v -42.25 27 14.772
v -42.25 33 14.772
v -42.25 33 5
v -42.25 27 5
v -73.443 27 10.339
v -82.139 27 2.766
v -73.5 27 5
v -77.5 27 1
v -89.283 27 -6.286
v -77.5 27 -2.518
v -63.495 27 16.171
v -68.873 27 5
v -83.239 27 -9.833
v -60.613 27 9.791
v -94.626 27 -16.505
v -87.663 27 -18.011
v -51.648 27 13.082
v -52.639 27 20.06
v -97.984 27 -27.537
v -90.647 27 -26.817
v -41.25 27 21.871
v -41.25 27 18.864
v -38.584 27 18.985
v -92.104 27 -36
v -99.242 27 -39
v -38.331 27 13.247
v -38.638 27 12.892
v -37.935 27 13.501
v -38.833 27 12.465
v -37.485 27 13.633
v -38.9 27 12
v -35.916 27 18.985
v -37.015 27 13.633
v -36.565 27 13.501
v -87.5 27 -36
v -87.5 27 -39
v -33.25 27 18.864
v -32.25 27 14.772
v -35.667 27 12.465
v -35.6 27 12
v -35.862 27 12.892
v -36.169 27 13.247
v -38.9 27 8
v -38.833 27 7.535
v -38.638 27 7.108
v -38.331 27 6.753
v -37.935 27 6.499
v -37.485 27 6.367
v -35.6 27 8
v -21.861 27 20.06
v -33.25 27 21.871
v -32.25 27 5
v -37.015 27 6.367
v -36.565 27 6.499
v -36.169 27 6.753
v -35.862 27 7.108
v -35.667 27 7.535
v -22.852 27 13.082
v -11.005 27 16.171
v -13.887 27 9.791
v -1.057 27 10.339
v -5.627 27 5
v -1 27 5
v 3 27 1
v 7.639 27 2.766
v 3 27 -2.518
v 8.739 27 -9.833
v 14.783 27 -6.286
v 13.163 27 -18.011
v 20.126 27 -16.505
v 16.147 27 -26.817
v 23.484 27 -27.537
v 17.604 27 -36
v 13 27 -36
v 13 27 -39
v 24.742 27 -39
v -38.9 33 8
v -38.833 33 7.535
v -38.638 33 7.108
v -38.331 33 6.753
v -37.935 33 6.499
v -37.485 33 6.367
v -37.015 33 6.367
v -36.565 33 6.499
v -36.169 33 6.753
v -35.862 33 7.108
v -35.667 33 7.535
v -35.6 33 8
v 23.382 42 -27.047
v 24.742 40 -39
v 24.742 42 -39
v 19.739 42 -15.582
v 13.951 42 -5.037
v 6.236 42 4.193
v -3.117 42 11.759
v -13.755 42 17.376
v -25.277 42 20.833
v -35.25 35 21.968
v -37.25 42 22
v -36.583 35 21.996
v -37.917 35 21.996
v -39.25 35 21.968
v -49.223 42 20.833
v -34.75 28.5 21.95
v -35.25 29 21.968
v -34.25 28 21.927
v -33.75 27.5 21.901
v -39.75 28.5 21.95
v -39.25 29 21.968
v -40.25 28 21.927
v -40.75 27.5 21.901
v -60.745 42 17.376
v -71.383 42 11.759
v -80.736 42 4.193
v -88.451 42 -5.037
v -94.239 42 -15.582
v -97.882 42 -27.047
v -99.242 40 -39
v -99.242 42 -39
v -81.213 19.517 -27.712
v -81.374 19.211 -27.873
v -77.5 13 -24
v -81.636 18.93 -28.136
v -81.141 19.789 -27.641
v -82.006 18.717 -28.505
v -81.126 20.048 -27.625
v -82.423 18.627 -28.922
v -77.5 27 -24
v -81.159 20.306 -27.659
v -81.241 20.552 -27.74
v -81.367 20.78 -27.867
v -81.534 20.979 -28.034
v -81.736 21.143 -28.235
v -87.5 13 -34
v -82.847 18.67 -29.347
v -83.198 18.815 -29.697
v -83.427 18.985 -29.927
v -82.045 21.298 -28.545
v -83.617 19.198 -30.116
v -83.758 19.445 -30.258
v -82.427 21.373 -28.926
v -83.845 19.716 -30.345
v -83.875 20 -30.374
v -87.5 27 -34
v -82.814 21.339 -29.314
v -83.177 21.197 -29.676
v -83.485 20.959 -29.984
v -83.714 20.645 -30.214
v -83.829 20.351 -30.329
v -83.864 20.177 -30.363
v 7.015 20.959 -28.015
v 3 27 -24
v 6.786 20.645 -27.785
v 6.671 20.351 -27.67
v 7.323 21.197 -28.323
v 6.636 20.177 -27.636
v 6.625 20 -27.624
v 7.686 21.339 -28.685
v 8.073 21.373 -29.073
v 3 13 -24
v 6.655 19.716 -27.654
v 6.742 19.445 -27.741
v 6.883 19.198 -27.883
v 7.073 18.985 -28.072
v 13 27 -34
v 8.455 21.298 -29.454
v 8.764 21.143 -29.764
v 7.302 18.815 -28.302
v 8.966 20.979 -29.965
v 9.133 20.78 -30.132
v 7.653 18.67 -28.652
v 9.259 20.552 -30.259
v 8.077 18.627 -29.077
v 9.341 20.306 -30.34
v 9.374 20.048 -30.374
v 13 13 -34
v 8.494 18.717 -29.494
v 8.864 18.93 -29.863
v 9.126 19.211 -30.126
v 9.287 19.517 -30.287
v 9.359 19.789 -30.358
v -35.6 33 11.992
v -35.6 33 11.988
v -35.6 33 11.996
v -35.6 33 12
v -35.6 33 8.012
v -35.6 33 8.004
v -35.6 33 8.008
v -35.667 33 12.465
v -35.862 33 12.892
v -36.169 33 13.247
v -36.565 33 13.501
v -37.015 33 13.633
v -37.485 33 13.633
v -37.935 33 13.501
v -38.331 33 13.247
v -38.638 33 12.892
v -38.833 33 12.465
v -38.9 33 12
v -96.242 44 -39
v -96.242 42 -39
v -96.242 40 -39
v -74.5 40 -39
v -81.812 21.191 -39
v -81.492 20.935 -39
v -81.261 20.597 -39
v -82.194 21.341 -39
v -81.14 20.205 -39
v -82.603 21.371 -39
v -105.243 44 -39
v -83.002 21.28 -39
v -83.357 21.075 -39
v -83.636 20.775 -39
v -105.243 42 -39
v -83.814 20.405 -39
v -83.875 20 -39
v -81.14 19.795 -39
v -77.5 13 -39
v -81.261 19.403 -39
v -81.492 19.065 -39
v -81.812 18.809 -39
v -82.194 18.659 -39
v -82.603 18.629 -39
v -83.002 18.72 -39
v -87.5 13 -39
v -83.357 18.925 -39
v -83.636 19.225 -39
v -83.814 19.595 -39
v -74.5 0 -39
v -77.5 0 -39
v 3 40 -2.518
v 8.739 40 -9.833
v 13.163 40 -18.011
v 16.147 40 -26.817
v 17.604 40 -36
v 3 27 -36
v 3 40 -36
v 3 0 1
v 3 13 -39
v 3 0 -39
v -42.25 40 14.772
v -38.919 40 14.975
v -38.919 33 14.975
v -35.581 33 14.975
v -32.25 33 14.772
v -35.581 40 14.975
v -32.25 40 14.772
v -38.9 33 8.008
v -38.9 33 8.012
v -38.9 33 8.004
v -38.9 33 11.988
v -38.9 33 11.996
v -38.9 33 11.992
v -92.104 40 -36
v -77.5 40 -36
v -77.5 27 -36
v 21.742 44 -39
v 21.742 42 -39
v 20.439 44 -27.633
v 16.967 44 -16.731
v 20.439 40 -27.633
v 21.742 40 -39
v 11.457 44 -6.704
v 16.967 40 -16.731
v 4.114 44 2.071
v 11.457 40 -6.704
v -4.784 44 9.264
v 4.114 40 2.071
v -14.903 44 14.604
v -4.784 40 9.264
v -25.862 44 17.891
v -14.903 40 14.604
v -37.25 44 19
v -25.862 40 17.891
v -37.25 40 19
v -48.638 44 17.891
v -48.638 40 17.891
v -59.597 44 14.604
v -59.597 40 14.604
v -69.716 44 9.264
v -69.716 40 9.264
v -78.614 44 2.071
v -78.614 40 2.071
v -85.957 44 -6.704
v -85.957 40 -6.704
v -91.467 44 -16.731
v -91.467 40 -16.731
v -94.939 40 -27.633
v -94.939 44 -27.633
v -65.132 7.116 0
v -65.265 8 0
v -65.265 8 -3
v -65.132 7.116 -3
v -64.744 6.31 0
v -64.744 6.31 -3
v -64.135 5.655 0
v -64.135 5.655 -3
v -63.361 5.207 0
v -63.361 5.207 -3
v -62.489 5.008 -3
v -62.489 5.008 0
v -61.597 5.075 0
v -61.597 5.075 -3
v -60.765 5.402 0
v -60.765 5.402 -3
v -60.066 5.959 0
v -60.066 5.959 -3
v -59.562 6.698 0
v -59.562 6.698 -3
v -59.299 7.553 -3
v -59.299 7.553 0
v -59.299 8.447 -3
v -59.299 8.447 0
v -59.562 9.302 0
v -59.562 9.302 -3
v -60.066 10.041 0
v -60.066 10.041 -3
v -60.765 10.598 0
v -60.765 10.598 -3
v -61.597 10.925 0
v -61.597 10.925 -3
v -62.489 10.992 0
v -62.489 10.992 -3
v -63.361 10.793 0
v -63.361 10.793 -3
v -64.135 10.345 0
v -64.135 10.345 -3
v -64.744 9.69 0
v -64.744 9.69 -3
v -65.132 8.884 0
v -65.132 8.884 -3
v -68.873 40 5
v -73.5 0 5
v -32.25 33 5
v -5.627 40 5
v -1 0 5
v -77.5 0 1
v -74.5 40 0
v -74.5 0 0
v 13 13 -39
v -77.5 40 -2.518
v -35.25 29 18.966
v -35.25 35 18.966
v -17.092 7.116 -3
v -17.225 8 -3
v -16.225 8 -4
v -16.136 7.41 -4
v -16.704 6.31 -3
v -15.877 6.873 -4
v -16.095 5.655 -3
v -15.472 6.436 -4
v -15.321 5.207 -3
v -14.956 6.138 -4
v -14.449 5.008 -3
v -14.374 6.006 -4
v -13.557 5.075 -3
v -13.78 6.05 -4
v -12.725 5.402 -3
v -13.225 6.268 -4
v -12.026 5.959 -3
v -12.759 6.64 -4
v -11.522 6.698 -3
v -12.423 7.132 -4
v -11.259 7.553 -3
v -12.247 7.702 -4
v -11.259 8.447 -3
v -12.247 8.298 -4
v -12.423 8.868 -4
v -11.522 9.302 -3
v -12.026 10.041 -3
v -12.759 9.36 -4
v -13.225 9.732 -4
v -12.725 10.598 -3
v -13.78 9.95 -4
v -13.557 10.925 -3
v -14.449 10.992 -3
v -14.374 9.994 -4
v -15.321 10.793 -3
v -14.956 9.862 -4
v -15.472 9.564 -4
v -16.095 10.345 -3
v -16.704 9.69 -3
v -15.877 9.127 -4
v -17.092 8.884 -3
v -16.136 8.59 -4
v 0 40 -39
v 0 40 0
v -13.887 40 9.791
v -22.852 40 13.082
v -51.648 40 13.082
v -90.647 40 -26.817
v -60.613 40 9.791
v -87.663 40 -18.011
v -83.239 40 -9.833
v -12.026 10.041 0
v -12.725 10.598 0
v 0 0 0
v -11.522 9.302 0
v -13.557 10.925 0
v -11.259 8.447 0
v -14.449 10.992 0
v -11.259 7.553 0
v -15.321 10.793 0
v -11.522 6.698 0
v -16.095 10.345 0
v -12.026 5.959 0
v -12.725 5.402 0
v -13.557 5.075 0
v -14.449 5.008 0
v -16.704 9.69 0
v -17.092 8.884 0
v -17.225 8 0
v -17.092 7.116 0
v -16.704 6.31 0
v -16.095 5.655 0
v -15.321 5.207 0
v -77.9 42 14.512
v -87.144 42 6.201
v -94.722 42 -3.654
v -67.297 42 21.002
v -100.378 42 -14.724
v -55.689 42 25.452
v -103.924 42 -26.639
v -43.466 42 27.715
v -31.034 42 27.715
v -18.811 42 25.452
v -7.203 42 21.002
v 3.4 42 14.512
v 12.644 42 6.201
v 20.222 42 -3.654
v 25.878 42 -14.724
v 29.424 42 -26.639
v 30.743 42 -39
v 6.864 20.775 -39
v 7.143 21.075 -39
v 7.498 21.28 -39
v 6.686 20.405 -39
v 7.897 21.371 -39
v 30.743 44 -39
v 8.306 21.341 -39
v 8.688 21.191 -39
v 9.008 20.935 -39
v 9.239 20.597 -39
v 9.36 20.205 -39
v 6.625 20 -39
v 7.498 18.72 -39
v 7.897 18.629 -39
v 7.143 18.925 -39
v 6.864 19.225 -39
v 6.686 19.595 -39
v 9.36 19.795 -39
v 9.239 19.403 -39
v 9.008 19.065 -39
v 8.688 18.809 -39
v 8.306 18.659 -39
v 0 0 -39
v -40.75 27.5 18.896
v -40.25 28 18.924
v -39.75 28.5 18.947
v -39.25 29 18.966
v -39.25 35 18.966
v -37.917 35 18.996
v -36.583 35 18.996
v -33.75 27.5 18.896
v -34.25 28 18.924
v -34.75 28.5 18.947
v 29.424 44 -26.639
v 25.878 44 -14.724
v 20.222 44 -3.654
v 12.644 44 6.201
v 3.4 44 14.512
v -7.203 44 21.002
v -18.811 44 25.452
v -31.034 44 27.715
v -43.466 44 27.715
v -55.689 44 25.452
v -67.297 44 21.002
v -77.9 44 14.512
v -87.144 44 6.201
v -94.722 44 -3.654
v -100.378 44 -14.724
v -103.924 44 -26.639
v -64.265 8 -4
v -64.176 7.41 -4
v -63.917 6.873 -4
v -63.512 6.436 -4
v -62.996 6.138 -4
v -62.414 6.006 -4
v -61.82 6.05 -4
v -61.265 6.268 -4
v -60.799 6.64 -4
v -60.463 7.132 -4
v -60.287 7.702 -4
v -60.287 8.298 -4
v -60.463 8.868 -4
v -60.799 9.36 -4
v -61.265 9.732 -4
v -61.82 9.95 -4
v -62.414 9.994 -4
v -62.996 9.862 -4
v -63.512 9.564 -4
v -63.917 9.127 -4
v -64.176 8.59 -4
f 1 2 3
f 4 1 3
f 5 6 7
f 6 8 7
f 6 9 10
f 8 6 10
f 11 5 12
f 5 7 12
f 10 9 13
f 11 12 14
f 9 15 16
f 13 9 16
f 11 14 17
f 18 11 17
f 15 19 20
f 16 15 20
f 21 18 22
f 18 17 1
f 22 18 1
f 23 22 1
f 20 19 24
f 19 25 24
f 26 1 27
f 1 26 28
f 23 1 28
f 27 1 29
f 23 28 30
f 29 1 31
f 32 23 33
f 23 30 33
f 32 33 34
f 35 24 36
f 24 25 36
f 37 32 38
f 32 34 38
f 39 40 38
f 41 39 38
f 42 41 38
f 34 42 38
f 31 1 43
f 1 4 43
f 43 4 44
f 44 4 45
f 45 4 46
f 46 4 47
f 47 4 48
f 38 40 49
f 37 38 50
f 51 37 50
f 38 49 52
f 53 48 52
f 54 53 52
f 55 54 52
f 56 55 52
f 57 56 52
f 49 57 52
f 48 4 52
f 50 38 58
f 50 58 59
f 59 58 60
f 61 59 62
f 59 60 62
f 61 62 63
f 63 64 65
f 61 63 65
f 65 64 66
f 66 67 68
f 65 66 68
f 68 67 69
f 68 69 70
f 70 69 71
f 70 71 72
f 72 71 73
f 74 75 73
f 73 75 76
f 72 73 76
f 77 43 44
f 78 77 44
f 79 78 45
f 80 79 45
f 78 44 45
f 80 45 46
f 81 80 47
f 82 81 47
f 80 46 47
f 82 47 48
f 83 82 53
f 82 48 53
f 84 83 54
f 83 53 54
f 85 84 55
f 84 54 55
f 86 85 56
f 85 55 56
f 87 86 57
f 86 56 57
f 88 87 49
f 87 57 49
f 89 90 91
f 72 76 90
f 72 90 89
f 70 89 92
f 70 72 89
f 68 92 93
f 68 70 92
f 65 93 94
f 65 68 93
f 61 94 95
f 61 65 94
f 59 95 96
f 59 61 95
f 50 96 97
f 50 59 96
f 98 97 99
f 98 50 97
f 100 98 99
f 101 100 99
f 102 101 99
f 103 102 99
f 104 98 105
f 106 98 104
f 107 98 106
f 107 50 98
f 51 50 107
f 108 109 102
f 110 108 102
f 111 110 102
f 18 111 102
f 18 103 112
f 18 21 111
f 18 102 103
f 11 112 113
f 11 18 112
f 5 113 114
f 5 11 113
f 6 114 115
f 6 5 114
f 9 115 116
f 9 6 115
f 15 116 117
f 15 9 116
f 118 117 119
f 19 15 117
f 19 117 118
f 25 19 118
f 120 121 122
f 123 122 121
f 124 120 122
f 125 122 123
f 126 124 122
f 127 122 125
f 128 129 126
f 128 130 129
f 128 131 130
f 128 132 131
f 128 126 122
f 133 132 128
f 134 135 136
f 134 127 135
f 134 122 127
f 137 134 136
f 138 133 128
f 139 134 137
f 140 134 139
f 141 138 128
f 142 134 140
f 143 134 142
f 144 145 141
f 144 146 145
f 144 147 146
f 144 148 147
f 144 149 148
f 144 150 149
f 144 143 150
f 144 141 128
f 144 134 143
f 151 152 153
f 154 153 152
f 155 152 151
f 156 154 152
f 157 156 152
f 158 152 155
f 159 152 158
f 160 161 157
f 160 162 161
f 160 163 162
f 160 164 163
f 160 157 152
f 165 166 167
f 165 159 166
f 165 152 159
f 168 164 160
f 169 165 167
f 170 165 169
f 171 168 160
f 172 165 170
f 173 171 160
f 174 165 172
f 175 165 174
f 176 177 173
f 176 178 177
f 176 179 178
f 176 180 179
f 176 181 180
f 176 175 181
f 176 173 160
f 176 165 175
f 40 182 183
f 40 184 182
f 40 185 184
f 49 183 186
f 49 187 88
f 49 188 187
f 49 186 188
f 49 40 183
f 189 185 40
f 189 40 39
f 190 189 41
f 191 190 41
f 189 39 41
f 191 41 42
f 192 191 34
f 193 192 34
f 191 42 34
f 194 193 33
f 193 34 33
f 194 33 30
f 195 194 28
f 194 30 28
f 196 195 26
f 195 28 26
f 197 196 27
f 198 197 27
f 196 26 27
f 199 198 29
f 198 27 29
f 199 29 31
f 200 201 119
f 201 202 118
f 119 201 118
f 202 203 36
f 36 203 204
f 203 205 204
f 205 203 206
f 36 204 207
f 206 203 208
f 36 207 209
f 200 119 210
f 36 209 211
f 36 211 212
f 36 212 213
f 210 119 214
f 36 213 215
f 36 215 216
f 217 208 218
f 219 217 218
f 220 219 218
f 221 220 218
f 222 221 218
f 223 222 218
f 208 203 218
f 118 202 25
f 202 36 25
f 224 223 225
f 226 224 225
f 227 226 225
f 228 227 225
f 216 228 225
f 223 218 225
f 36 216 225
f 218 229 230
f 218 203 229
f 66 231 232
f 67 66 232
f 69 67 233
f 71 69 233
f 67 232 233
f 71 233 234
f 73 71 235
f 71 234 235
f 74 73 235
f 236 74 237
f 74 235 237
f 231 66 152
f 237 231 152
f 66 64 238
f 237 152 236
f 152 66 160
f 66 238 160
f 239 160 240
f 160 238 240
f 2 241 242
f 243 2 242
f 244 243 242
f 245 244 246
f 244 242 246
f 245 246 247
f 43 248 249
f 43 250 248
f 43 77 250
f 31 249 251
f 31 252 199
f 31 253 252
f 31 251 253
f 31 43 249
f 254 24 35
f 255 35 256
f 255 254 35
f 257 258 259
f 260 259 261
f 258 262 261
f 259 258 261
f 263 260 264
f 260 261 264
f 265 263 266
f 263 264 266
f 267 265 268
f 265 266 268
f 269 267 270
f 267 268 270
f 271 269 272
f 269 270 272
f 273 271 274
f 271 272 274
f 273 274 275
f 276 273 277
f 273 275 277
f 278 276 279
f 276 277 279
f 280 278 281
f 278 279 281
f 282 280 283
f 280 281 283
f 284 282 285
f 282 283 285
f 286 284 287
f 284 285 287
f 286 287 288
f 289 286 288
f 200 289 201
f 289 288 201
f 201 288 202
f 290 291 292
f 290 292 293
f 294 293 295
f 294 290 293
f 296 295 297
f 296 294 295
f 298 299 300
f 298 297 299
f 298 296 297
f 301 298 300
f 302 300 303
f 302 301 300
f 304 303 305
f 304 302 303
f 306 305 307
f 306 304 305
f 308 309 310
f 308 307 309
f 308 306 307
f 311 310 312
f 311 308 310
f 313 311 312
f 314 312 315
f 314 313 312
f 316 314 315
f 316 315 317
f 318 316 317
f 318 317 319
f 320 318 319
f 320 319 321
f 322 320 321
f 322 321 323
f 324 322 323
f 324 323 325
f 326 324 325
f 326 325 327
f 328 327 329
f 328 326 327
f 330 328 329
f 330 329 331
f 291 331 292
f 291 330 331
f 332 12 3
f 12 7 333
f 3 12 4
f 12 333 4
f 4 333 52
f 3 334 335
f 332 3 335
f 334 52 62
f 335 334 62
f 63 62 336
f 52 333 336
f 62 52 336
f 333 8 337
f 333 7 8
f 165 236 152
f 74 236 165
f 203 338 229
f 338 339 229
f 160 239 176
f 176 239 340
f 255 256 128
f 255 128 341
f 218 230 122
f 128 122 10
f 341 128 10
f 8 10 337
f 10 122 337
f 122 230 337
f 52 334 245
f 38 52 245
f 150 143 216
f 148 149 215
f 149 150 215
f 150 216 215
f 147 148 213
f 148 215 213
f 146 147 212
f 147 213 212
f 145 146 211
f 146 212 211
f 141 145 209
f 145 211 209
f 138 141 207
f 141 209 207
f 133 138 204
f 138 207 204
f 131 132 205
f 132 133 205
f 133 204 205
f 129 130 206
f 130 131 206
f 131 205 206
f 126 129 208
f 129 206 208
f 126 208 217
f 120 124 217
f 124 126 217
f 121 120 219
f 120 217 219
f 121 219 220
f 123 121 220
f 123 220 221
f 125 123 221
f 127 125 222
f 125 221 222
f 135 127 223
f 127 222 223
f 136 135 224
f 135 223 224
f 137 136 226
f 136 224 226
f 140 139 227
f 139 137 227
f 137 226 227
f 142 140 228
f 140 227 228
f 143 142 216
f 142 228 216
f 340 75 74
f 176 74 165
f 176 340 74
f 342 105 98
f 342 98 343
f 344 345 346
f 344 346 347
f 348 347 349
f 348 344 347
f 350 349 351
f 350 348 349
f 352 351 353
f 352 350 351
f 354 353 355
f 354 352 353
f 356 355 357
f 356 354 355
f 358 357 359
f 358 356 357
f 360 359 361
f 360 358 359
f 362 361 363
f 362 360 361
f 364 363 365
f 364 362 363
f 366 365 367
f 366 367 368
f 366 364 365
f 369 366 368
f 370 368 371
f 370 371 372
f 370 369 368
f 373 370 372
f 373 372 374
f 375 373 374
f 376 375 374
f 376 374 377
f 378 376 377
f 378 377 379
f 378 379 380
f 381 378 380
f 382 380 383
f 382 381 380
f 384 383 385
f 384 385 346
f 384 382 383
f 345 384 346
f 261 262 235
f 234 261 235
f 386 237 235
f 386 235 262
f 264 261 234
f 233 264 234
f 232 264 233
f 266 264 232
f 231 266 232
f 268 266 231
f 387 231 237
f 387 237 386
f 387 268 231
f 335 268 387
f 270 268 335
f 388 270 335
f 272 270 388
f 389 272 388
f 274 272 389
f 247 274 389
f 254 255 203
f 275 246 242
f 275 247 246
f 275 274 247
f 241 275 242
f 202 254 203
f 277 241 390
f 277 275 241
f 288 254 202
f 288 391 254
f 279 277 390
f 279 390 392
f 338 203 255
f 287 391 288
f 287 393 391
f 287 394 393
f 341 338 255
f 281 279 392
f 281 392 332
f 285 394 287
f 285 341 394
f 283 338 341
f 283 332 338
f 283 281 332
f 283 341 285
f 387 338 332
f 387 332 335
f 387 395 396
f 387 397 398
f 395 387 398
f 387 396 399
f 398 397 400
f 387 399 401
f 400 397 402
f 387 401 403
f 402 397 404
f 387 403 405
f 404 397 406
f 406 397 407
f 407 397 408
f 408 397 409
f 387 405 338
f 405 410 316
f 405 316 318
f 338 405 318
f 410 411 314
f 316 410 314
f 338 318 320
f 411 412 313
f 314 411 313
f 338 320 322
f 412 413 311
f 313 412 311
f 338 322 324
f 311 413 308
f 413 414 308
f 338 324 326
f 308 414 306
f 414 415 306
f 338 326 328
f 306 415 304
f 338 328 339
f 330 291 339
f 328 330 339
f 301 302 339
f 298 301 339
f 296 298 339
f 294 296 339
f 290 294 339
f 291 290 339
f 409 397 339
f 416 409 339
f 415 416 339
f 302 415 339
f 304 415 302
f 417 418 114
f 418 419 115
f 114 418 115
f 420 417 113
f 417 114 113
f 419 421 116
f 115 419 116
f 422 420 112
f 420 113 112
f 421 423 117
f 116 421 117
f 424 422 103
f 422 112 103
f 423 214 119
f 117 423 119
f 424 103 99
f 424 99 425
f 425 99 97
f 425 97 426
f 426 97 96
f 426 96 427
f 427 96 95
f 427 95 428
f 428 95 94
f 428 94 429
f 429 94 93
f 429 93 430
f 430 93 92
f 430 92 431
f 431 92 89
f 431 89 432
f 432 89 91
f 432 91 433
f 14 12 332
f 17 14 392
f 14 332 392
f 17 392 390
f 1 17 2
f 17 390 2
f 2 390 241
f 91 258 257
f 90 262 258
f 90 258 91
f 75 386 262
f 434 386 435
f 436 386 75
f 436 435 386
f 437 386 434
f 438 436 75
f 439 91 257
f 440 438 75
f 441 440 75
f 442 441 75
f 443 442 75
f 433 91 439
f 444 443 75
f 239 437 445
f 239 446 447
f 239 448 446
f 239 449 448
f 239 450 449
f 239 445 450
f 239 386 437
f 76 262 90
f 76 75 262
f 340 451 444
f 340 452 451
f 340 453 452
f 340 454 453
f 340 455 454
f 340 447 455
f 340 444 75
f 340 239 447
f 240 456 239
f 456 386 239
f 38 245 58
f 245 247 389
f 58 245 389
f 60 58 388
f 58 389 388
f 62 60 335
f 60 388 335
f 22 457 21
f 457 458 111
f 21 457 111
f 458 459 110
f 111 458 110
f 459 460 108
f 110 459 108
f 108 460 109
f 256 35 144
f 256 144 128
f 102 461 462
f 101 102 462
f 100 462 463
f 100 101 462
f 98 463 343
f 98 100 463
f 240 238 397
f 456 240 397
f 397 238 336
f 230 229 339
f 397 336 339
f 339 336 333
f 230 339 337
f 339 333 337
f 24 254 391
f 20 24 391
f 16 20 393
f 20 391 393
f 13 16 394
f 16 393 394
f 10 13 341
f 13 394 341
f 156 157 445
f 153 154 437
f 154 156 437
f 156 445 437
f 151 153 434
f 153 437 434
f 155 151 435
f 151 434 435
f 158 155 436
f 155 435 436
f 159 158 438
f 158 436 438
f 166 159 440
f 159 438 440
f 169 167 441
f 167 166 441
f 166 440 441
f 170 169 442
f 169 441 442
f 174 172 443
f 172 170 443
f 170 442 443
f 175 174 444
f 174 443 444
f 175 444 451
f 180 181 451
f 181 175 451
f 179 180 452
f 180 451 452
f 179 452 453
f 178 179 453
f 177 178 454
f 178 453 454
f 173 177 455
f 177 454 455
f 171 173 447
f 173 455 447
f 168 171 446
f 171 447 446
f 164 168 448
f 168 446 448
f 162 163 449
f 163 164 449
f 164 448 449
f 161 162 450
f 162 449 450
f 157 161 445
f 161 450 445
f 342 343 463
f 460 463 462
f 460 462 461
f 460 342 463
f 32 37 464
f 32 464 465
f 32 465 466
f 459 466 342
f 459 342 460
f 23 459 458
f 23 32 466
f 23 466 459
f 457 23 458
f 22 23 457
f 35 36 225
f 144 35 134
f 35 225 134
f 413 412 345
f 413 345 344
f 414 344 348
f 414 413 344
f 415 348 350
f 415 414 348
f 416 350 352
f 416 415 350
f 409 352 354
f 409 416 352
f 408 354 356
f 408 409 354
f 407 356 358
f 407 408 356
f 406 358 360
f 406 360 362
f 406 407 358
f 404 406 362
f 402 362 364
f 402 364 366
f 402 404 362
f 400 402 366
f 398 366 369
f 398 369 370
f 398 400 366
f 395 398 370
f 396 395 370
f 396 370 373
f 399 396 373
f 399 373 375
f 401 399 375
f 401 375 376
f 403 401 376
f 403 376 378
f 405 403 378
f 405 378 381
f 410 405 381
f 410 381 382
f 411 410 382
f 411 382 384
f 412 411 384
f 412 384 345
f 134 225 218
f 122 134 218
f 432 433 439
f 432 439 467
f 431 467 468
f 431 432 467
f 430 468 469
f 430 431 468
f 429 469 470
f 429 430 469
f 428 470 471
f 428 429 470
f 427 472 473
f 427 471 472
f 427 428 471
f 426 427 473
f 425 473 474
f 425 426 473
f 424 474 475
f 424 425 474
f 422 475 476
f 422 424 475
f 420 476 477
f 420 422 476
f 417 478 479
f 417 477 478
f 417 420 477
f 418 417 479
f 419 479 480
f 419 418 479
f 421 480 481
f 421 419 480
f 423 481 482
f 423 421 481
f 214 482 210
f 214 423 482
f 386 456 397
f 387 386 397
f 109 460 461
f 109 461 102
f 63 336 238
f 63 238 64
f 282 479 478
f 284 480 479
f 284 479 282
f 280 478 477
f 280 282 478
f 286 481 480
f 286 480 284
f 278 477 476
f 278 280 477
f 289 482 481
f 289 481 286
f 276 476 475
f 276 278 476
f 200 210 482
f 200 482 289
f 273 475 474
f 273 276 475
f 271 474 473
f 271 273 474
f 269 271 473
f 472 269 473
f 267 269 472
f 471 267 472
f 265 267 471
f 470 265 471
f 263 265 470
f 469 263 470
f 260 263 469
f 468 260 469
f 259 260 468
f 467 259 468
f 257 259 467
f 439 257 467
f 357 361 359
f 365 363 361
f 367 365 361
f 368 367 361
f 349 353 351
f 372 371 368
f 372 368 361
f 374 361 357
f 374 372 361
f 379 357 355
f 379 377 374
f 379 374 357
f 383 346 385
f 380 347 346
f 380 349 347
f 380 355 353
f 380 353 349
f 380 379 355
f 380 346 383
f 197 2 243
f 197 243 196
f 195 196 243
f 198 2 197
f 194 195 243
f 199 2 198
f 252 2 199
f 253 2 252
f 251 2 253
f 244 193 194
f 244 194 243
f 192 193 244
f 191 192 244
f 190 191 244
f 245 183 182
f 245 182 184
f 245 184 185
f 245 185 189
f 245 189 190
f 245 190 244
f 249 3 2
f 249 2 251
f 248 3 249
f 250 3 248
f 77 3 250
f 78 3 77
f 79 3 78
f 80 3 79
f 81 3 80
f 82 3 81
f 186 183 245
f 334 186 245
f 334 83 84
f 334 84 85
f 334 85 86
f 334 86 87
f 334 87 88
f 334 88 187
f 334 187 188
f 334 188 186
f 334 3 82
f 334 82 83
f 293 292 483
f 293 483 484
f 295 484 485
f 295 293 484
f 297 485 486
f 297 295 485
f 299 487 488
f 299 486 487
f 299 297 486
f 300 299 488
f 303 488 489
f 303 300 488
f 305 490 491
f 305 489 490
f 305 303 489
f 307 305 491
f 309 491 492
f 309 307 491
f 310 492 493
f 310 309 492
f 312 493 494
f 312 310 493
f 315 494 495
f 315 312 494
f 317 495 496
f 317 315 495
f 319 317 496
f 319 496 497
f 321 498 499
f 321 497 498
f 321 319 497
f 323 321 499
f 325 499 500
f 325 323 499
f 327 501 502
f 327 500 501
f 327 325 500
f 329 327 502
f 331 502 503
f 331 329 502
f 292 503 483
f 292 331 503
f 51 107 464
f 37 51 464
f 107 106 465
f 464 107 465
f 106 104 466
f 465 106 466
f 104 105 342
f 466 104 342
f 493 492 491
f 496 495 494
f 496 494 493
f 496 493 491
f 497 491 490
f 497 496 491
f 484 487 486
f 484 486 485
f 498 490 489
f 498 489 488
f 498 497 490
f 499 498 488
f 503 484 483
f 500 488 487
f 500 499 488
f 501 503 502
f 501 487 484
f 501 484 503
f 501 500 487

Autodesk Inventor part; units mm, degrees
ref_plane "YZ Plane" through (0, 0, 0) normal (1, 0, 0) x (0, 1, 0)
ref_plane "XZ Plane" through (0, 0, 0) normal (0, 1, 0) x (-1, 0, 0)
sketch "Sketch1" plane through (0, 0, 0) normal (0, 1, 0) x (-1, 0, 0)
  line L0 (0, 0) -> (74.5, 0)
  line L1 (74.5, 0) -> (74.5, -40)
  line L2 (74.5, -40) -> (0, -40)
  line L3 (0, -40) -> (0, 0)
  line L4 (74.5, -40) -> (77.5, -40)
  line L5 (77.5, -40) -> (77.5, 0)
  line L6 (77.5, 0) -> (74.5, 0)
  line L7 (74.5, 0) -> (74.5, -40)
  line L8 (0, -40) -> (-3, -40)
  line L9 (-3, -40) -> (-3, 0)
  line L10 (-3, 0) -> (0, 0)
  line L11 (0, 0) -> (0, -40)
  line L12 (-3, 0) -> (77.5, 0)
  line L13 (77.5, 0) -> (77.5, 5)
  line L14 (77.5, 5) -> (-3, 5)
  line L15 (-3, 5) -> (-3, 0)
  dimension "d0" = 74.5
  dimension "d1" = 40
  dimension "d2" = 3
  dimension "d3" = 3
  dimension "d4" = 40
  dimension "d5" = 80.5
  dimension "d6" = 5
extrude "Extrusion1" add sketch "Sketch1" along normal blind 40 contours L10 L15 L14 L13 L6 L0 | L3 L8 L9 L10 | L6 L5 L4 L1
sketch "Sketch3" plane through (0, 0, 0) normal (0, 0, -1) x (-1, 0, 0)
  line L0 (0, 0) -> (14.225, 0)
  line L1 (0, 0) -> (74.5, 0) projected
  line L2 (14.225, 0) -> (14.225, 8)
  circle A0 centre (14.225, 8) radius 3
  line L3 (37.25, 0) -> (37.25, 20.4526)
  line L4 (74.5, 0) -> (74.5, 40) projected
  line L5 (74.5, 0) -> (74.5, 8)
  line L6 (74.5, 8) -> (62.265, 8)
  line L7 (74.5, 8) -> (86.735, 8) construction
  circle A1 centre (62.265, 8) radius 3
  dimension "d9" = 14.225
  dimension "d10" = 8
  dimension "d11" = 6
  dimension "d12" = 8
  dimension "d13" = 12.235
  dimension "d14" = 180
  dimension "d15" = 6
extrude "Extrusion2" add sketch "Sketch3" along normal blind 4
chamfer "Chamfer1" distance 1 angle 45 2 edges at (-11.225, 8, -4) (-59.265, 8, -4)
sketch "Sketch4" plane through (0, 40, 0) normal (0, 1, 0) x (1, 0, 0)
  line L0 (3, -5) -> (3, 40) projected
  line L1 (-77.5, 40) -> (-77.5, -5) projected
  line L2 (3, 40) -> (-77.5, 40)
  line L3 (-77.5, 40) -> (-77.5, 39)
  line L4 (-77.5, 39) -> (3, 39)
  line L5 (3, 39) -> (3, 40)
  point P0 (0, 0)
  dimension "d21" = 1
extrude "Extrusion3" cut sketch "Sketch4" against normal blind 40
ref_plane "Work Plane1" through (0, 20, 0) normal (0, 1, 0) x (1, 0, 0)
sketch "Sketch6" plane through (0, 20, 0) normal (0, 1, 0) x (1, 0, 0)
  line L0 (0, 39) -> (3, 39) projected
  line L1 (3, 39) -> (13, 39)
  line L2 (13, 39) -> (13, 24)
  line L3 (13, 24) -> (3, 24)
  line L4 (3, 24) -> (3, 39)
  line L5 (0, 0) -> (-74.5, 0) projected
  line L6 (-37.25, 0) -> (-37.25, 6.791)
  line L7 (-74.5, 39) -> (-77.5, 39)
  line L8 (-77.5, 39) -> (-87.5, 39)
  line L9 (-87.5, 39) -> (-87.5, 24)
  line L10 (-87.5, 24) -> (-77.5, 24)
  line L11 (-77.5, 24) -> (-77.5, 39)
  dimension "d24" = 10
  dimension "d25" = 15
extrude "Extrusion4" add sketch "Sketch6" along normal mid plane 14
chamfer "Chamfer2" distance 10 angle 45 1 edges at (-87.5, 20, -24)
chamfer "Chamfer3" distance 10 angle 45 1 edges at (13, 20, -24)
sketch "Sketch7" plane through (-74.5, 40, -39) normal (0, 0, -1) x (-1, 0, 0)
  line L0 (13, -27) -> (13, -13) projected
  line L1 (3, -13) -> (13, -13) projected
  line L2 (13, -13) -> (3, -13)
  line L3 (13, -13) -> (13, -27)
  line L4 (13, -20) -> (8, -20)
  circle A0 centre (8, -20) radius 1.375
  line L5 (-74.5, 0) -> (0, 0) projected
  line L6 (-37.25, 0) -> (-37.25, -5.3996)
  circle A1 centre (-82.5, -20) radius 1.375
  point P0 (-74.5, -40)
  dimension "d34" = 5
  dimension "d35" = 2.75
extrude "Extrusion5" cut sketch "Sketch7" against normal blind 14
sketch "Sketch9" plane through (0, 40, 0) normal (0, 1, 0) x (1, 0, 0)
  line L0 (-77.5, 39) -> (-77.5, -5) projected
  line L1 (13, 39) -> (3, 39) projected
  line L2 (-77.5, -5) -> (3, -5)
  line L3 (3, 39) -> (-77.5, 39)
  line L4 (-77.5, 39) -> (-77.5, -5)
  line L5 (-37.25, 39) -> (-37.25, 40)
  line L6 (-37.25, 39) -> (-36.25, 39) construction
  circle A0 centre (-37.25, 40) radius 62
  circle A1 centre (-37.25, 40) radius 55
  line L7 (-37.25, 40) -> (-42.25, 40)
  line L8 (-42.25, 40) -> (-32.25, 40)
  line L9 (-32.25, 40) -> (-32.25, -25)
  line L10 (-32.25, -25) -> (-42.25, -25)
  line L11 (-42.25, -25) -> (-42.25, 40)
  line L12 (-37.25, 39) -> (-127.25, 39)
  line L13 (-37.25, 39) -> (52.75, 39) construction
  line L14 (-127.25, 39) -> (47.7384, 39)
  line L15 (-77.5, 39) -> (-77.5, 24) projected
  line L16 (-77.5, 39) -> (-93.5, 39)
  line L17 (-93.5, 39) -> (-93.5, 36)
  line L18 (-92.1044, 36) -> (-77.5, 36)
  line L19 (-77.5, 36) -> (-77.5, 39)
  line L20 (3, -5) -> (3, 39) projected
  line L21 (3, 39) -> (19, 39)
  line L22 (19, 39) -> (19, 36)
  line L23 (17.6044, 36) -> (3, 36)
  line L24 (3, 36) -> (3, 39)
  line L25 (3, 39) -> (19, 39)
  line L26 (19, 39) -> (19, 36)
  line L27 (17.6044, 36) -> (3, 36)
  line L28 (3, 36) -> (3, 39)
  line L29 (3, -5) -> (3, 2.5175)
  line L30 (3, 36) -> (3, 39)
  point P0 (0, 0)
  point P1 (3, 2.5175)
  point P2 (-5.6272, -5)
  point P3 (-32.25, -14.7723)
  point P4 (-32.25, -5)
  point P5 (-42.25, -5)
  point P6 (-42.25, -14.7723)
  point P7 (-68.8728, -5)
  point P8 (-77.5, 2.5175)
  point P9 (-99.2419, 39)
  point P10 (24.7419, 39)
  dimension "d38" = 1
  dimension "d39" = 90
  dimension "d40" = 124
  dimension "d41" = 110
  dimension "d42" = 5
  dimension "d43" = 10
  dimension "d44" = 65
  dimension "d45" = 90
  dimension "d46" = 180
  dimension "d47" = 16
  dimension "d48" = 3
  dimension "d49" = 16
  dimension "d50" = 3
extrude "Extrusion6" add sketch "Sketch9" against normal blind 13 contours L0 L18 A1 L12 | A1 L0 L2 L11 A0 L12 | L2 L9 A1 L11 | A1 L9 A0 L11 | L14 A0 L9 A1 L2 L20 | A1 L23 L20 L1 L14
sketch "Sketch10" plane through (0, 40, 0) normal (0, 1, 0) x (1, 0, 0)
  arc A0 (-99.2419, 39) -> (24.7419, 39) centre (-37.25, 40) ccw projected
  line L0 (-37.25, -22) -> (-37.25, -10)
  circle A1 centre (-37.25, -10) radius 1.375
  point P0 (0, 0)
  dimension "d53" = 12
  dimension "d54" = 2.75
extrude "Extrusion7" cut sketch "Sketch10" against normal blind 13
sketch "Sketch11" plane through (0, 27, 0) normal (0, -1, 0) x (1, 0, 0)
  circle A0 centre (-37.25, 10) radius 1.375 projected
  line L0 (-37.25, 10) -> (-37.25, 12)
  line L1 (-37.25, 12) -> (-37.25, 8)
  arc A1 (-38.374, 9.208) -> (-36.126, 9.208) centre (-37.25, 8) ccw
  arc A2 (-36.126, 10.792) -> (-38.374, 10.792) centre (-37.25, 12) ccw
  line L2 (-38.9, 12) -> (-38.9, 8)
  line L3 (-35.6, 8) -> (-35.6, 12)
  point P0 (0, 0)
  point P1 (-38.625, 10.25)
  point P2 (-35.875, 10.25)
  dimension "d57" = 2
  dimension "d58" = 4
  dimension "d59" = 3.3
  dimension "d60" = 3.3
extrude "Extrusion8" cut sketch "Sketch11" against normal blind 13 contours A0 A2 | A1 A0
sketch "Sketch12" plane through (0, 27, 0) normal (0, -1, 0) x (1, 0, 0)
  point P0 (0, 0)
sketch "Sketch13" plane through (0, 40, 0) normal (0, 1, 0) x (1, 0, 0)
  arc A0 (-99.2419, 39) -> (24.7419, 39) centre (-37.25, 40) ccw projected
  circle A1 centre (-37.25, 40) radius 62.25
  line L0 (-42.25, -14.7723) -> (-42.25, -5) projected
  circle A2 centre (-37.25, 40) radius 55
  line L1 (-32.25, -5) -> (-42.25, -5) projected
  line L2 (-32.25, -14.7723) -> (-32.25, -5) projected
  line L3 (-42.25, -5) -> (-32.25, -5)
  line L4 (-32.25, -5) -> (-32.25, -14.7723)
  line L5 (-42.25, -14.7723) -> (-42.25, -5)
  point P0 (0, 0)
extrude "Extrusion9" cut sketch "Sketch13" against normal blind 7 contours L0 L1 L2 A2 picked at (-36.6938, -8.3249)
sketch "Sketch14" plane through (0, 27, 0) normal (0, -1, 0) x (1, 0, 0)
  arc A0 (-36.126, 10.792) -> (-38.374, 10.792) centre (-37.25, 12) ccw projected
  arc A1 (-35.6, 12) -> (-38.9, 12) centre (-37.25, 12) ccw
  arc A2 (-38.374, 9.208) -> (-36.126, 9.208) centre (-37.25, 8) ccw projected
  arc A3 (-38.9, 8) -> (-35.6, 8) centre (-37.25, 8) ccw
  line L0 (-35.6, 12) -> (-35.6, 8)
  line L1 (-38.9, 8) -> (-38.9, 12)
  point P0 (0, 0)
extrude "Extrusion10" cut sketch "Sketch14" against normal blind 10
sketch "Sketch15" plane through (0, 27, 0) normal (0, -1, 0) x (1, 0, 0)
  arc A0 (-5.6272, 5) -> (-68.8728, 5) centre (-37.25, -40) ccw projected
  line L0 (-42.25, 14.7723) -> (-42.25, 5) projected
  circle A1 centre (-37.25, -40) radius 55
  circle A2 centre (-37.25, -40) radius 62
  circle A3 centre (-37.25, -40) radius 59
  line L1 (-37.25, -40) -> (-35.25, -40)
  line L2 (-35.25, -40) -> (-39.25, -40)
  line L3 (-39.25, -40) -> (-39.25, 33.7225)
  line L4 (-39.25, 33.7225) -> (-35.25, 33.7225)
  line L5 (-35.25, 33.7225) -> (-35.25, -40)
  line L6 (-39.25, 33.7225) -> (-35.25, 33.7225)
  line L7 (-35.25, 33.7225) -> (-35.25, -40)
  line L8 (-35.25, -40) -> (-39.25, -40)
  line L9 (-39.25, -40) -> (-39.25, 33.7225)
  point P0 (0, 0)
  point P1 (-39.25, 21.9677)
  point P2 (-39.25, 18.9661)
  point P3 (-35.25, 18.9661)
  point P4 (-35.25, 21.9677)
  dimension "d67" = 118
  dimension "d68" = 2
  dimension "d69" = 4
extrude "Extrusion11" cut sketch "Sketch15" against normal blind 8 contours L3 A2 L5 A3 picked at (-35.6944, 19.9767)
chamfer "Chamfer4" distance 2 angle 45 2 edges at (-35.25, 27, 20.4669) (-39.25, 27, 20.4669)
sketch "Sketch16" plane through (0, 40, 0) normal (0, 1, 0) x (1, 0, 0)
  arc A0 (3, 2.5175) -> (17.6044, 36) centre (-37.25, 40) ccw projected
  circle A1 centre (-37.25, 40) radius 59
  circle A2 centre (-37.25, 40) radius 62
  line L0 (24.7419, 39) -> (0, 39) projected
  line L1 (24.7419, 39) -> (21.7415, 39)
  arc A3 (-99.2419, 39) -> (24.7419, 39) centre (-37.25, 40) ccw projected
  line L2 (-99.2419, 39) -> (-96.2415, 39)
  line L3 (-74.5, 39) -> (-99.2419, 39) projected
  point P0 (0, 0)
  dimension "d75" = 118
extrude "Extrusion12" add sketch "Sketch16" along normal blind 2 contours A1 L0 A2 L2 picked at (-37.25, -19.8358)
sketch "Sketch17" plane through (0, 42, 0) normal (0, 1, 0) x (1, 0, 0)
  arc A0 (-68.8728, -5) -> (-5.6272, -5) centre (-37.25, 40) ccw projected
  circle A1 centre (-37.25, 40) radius 59
  circle A2 centre (-37.25, 40) radius 68
  line L0 (3, 39) -> (13, 39) projected
  line L1 (13, 39) -> (38.5571, 39)
  line L2 (13, 39) -> (24.7419, 39) projected
  line L3 (38.5571, 39) -> (-112.8273, 39)
  point P0 (0, 0)
  point P1 (-96.2415, 39)
  point P2 (-105.2426, 39)
  point P3 (30.7426, 39)
  point P4 (21.7415, 39)
  dimension "d78" = 136
extrude "Extrusion13" add sketch "Sketch17" along normal blind 2 contours A1 L1 A2 L3 picked at (-35.4549, -24.766)
chamfer "Chamfer5" distance 4 angle 45 2 edges at (3, 13.5, 5) (-77.5, 13.5, 5)
properties part number "gripper_mount_female"
